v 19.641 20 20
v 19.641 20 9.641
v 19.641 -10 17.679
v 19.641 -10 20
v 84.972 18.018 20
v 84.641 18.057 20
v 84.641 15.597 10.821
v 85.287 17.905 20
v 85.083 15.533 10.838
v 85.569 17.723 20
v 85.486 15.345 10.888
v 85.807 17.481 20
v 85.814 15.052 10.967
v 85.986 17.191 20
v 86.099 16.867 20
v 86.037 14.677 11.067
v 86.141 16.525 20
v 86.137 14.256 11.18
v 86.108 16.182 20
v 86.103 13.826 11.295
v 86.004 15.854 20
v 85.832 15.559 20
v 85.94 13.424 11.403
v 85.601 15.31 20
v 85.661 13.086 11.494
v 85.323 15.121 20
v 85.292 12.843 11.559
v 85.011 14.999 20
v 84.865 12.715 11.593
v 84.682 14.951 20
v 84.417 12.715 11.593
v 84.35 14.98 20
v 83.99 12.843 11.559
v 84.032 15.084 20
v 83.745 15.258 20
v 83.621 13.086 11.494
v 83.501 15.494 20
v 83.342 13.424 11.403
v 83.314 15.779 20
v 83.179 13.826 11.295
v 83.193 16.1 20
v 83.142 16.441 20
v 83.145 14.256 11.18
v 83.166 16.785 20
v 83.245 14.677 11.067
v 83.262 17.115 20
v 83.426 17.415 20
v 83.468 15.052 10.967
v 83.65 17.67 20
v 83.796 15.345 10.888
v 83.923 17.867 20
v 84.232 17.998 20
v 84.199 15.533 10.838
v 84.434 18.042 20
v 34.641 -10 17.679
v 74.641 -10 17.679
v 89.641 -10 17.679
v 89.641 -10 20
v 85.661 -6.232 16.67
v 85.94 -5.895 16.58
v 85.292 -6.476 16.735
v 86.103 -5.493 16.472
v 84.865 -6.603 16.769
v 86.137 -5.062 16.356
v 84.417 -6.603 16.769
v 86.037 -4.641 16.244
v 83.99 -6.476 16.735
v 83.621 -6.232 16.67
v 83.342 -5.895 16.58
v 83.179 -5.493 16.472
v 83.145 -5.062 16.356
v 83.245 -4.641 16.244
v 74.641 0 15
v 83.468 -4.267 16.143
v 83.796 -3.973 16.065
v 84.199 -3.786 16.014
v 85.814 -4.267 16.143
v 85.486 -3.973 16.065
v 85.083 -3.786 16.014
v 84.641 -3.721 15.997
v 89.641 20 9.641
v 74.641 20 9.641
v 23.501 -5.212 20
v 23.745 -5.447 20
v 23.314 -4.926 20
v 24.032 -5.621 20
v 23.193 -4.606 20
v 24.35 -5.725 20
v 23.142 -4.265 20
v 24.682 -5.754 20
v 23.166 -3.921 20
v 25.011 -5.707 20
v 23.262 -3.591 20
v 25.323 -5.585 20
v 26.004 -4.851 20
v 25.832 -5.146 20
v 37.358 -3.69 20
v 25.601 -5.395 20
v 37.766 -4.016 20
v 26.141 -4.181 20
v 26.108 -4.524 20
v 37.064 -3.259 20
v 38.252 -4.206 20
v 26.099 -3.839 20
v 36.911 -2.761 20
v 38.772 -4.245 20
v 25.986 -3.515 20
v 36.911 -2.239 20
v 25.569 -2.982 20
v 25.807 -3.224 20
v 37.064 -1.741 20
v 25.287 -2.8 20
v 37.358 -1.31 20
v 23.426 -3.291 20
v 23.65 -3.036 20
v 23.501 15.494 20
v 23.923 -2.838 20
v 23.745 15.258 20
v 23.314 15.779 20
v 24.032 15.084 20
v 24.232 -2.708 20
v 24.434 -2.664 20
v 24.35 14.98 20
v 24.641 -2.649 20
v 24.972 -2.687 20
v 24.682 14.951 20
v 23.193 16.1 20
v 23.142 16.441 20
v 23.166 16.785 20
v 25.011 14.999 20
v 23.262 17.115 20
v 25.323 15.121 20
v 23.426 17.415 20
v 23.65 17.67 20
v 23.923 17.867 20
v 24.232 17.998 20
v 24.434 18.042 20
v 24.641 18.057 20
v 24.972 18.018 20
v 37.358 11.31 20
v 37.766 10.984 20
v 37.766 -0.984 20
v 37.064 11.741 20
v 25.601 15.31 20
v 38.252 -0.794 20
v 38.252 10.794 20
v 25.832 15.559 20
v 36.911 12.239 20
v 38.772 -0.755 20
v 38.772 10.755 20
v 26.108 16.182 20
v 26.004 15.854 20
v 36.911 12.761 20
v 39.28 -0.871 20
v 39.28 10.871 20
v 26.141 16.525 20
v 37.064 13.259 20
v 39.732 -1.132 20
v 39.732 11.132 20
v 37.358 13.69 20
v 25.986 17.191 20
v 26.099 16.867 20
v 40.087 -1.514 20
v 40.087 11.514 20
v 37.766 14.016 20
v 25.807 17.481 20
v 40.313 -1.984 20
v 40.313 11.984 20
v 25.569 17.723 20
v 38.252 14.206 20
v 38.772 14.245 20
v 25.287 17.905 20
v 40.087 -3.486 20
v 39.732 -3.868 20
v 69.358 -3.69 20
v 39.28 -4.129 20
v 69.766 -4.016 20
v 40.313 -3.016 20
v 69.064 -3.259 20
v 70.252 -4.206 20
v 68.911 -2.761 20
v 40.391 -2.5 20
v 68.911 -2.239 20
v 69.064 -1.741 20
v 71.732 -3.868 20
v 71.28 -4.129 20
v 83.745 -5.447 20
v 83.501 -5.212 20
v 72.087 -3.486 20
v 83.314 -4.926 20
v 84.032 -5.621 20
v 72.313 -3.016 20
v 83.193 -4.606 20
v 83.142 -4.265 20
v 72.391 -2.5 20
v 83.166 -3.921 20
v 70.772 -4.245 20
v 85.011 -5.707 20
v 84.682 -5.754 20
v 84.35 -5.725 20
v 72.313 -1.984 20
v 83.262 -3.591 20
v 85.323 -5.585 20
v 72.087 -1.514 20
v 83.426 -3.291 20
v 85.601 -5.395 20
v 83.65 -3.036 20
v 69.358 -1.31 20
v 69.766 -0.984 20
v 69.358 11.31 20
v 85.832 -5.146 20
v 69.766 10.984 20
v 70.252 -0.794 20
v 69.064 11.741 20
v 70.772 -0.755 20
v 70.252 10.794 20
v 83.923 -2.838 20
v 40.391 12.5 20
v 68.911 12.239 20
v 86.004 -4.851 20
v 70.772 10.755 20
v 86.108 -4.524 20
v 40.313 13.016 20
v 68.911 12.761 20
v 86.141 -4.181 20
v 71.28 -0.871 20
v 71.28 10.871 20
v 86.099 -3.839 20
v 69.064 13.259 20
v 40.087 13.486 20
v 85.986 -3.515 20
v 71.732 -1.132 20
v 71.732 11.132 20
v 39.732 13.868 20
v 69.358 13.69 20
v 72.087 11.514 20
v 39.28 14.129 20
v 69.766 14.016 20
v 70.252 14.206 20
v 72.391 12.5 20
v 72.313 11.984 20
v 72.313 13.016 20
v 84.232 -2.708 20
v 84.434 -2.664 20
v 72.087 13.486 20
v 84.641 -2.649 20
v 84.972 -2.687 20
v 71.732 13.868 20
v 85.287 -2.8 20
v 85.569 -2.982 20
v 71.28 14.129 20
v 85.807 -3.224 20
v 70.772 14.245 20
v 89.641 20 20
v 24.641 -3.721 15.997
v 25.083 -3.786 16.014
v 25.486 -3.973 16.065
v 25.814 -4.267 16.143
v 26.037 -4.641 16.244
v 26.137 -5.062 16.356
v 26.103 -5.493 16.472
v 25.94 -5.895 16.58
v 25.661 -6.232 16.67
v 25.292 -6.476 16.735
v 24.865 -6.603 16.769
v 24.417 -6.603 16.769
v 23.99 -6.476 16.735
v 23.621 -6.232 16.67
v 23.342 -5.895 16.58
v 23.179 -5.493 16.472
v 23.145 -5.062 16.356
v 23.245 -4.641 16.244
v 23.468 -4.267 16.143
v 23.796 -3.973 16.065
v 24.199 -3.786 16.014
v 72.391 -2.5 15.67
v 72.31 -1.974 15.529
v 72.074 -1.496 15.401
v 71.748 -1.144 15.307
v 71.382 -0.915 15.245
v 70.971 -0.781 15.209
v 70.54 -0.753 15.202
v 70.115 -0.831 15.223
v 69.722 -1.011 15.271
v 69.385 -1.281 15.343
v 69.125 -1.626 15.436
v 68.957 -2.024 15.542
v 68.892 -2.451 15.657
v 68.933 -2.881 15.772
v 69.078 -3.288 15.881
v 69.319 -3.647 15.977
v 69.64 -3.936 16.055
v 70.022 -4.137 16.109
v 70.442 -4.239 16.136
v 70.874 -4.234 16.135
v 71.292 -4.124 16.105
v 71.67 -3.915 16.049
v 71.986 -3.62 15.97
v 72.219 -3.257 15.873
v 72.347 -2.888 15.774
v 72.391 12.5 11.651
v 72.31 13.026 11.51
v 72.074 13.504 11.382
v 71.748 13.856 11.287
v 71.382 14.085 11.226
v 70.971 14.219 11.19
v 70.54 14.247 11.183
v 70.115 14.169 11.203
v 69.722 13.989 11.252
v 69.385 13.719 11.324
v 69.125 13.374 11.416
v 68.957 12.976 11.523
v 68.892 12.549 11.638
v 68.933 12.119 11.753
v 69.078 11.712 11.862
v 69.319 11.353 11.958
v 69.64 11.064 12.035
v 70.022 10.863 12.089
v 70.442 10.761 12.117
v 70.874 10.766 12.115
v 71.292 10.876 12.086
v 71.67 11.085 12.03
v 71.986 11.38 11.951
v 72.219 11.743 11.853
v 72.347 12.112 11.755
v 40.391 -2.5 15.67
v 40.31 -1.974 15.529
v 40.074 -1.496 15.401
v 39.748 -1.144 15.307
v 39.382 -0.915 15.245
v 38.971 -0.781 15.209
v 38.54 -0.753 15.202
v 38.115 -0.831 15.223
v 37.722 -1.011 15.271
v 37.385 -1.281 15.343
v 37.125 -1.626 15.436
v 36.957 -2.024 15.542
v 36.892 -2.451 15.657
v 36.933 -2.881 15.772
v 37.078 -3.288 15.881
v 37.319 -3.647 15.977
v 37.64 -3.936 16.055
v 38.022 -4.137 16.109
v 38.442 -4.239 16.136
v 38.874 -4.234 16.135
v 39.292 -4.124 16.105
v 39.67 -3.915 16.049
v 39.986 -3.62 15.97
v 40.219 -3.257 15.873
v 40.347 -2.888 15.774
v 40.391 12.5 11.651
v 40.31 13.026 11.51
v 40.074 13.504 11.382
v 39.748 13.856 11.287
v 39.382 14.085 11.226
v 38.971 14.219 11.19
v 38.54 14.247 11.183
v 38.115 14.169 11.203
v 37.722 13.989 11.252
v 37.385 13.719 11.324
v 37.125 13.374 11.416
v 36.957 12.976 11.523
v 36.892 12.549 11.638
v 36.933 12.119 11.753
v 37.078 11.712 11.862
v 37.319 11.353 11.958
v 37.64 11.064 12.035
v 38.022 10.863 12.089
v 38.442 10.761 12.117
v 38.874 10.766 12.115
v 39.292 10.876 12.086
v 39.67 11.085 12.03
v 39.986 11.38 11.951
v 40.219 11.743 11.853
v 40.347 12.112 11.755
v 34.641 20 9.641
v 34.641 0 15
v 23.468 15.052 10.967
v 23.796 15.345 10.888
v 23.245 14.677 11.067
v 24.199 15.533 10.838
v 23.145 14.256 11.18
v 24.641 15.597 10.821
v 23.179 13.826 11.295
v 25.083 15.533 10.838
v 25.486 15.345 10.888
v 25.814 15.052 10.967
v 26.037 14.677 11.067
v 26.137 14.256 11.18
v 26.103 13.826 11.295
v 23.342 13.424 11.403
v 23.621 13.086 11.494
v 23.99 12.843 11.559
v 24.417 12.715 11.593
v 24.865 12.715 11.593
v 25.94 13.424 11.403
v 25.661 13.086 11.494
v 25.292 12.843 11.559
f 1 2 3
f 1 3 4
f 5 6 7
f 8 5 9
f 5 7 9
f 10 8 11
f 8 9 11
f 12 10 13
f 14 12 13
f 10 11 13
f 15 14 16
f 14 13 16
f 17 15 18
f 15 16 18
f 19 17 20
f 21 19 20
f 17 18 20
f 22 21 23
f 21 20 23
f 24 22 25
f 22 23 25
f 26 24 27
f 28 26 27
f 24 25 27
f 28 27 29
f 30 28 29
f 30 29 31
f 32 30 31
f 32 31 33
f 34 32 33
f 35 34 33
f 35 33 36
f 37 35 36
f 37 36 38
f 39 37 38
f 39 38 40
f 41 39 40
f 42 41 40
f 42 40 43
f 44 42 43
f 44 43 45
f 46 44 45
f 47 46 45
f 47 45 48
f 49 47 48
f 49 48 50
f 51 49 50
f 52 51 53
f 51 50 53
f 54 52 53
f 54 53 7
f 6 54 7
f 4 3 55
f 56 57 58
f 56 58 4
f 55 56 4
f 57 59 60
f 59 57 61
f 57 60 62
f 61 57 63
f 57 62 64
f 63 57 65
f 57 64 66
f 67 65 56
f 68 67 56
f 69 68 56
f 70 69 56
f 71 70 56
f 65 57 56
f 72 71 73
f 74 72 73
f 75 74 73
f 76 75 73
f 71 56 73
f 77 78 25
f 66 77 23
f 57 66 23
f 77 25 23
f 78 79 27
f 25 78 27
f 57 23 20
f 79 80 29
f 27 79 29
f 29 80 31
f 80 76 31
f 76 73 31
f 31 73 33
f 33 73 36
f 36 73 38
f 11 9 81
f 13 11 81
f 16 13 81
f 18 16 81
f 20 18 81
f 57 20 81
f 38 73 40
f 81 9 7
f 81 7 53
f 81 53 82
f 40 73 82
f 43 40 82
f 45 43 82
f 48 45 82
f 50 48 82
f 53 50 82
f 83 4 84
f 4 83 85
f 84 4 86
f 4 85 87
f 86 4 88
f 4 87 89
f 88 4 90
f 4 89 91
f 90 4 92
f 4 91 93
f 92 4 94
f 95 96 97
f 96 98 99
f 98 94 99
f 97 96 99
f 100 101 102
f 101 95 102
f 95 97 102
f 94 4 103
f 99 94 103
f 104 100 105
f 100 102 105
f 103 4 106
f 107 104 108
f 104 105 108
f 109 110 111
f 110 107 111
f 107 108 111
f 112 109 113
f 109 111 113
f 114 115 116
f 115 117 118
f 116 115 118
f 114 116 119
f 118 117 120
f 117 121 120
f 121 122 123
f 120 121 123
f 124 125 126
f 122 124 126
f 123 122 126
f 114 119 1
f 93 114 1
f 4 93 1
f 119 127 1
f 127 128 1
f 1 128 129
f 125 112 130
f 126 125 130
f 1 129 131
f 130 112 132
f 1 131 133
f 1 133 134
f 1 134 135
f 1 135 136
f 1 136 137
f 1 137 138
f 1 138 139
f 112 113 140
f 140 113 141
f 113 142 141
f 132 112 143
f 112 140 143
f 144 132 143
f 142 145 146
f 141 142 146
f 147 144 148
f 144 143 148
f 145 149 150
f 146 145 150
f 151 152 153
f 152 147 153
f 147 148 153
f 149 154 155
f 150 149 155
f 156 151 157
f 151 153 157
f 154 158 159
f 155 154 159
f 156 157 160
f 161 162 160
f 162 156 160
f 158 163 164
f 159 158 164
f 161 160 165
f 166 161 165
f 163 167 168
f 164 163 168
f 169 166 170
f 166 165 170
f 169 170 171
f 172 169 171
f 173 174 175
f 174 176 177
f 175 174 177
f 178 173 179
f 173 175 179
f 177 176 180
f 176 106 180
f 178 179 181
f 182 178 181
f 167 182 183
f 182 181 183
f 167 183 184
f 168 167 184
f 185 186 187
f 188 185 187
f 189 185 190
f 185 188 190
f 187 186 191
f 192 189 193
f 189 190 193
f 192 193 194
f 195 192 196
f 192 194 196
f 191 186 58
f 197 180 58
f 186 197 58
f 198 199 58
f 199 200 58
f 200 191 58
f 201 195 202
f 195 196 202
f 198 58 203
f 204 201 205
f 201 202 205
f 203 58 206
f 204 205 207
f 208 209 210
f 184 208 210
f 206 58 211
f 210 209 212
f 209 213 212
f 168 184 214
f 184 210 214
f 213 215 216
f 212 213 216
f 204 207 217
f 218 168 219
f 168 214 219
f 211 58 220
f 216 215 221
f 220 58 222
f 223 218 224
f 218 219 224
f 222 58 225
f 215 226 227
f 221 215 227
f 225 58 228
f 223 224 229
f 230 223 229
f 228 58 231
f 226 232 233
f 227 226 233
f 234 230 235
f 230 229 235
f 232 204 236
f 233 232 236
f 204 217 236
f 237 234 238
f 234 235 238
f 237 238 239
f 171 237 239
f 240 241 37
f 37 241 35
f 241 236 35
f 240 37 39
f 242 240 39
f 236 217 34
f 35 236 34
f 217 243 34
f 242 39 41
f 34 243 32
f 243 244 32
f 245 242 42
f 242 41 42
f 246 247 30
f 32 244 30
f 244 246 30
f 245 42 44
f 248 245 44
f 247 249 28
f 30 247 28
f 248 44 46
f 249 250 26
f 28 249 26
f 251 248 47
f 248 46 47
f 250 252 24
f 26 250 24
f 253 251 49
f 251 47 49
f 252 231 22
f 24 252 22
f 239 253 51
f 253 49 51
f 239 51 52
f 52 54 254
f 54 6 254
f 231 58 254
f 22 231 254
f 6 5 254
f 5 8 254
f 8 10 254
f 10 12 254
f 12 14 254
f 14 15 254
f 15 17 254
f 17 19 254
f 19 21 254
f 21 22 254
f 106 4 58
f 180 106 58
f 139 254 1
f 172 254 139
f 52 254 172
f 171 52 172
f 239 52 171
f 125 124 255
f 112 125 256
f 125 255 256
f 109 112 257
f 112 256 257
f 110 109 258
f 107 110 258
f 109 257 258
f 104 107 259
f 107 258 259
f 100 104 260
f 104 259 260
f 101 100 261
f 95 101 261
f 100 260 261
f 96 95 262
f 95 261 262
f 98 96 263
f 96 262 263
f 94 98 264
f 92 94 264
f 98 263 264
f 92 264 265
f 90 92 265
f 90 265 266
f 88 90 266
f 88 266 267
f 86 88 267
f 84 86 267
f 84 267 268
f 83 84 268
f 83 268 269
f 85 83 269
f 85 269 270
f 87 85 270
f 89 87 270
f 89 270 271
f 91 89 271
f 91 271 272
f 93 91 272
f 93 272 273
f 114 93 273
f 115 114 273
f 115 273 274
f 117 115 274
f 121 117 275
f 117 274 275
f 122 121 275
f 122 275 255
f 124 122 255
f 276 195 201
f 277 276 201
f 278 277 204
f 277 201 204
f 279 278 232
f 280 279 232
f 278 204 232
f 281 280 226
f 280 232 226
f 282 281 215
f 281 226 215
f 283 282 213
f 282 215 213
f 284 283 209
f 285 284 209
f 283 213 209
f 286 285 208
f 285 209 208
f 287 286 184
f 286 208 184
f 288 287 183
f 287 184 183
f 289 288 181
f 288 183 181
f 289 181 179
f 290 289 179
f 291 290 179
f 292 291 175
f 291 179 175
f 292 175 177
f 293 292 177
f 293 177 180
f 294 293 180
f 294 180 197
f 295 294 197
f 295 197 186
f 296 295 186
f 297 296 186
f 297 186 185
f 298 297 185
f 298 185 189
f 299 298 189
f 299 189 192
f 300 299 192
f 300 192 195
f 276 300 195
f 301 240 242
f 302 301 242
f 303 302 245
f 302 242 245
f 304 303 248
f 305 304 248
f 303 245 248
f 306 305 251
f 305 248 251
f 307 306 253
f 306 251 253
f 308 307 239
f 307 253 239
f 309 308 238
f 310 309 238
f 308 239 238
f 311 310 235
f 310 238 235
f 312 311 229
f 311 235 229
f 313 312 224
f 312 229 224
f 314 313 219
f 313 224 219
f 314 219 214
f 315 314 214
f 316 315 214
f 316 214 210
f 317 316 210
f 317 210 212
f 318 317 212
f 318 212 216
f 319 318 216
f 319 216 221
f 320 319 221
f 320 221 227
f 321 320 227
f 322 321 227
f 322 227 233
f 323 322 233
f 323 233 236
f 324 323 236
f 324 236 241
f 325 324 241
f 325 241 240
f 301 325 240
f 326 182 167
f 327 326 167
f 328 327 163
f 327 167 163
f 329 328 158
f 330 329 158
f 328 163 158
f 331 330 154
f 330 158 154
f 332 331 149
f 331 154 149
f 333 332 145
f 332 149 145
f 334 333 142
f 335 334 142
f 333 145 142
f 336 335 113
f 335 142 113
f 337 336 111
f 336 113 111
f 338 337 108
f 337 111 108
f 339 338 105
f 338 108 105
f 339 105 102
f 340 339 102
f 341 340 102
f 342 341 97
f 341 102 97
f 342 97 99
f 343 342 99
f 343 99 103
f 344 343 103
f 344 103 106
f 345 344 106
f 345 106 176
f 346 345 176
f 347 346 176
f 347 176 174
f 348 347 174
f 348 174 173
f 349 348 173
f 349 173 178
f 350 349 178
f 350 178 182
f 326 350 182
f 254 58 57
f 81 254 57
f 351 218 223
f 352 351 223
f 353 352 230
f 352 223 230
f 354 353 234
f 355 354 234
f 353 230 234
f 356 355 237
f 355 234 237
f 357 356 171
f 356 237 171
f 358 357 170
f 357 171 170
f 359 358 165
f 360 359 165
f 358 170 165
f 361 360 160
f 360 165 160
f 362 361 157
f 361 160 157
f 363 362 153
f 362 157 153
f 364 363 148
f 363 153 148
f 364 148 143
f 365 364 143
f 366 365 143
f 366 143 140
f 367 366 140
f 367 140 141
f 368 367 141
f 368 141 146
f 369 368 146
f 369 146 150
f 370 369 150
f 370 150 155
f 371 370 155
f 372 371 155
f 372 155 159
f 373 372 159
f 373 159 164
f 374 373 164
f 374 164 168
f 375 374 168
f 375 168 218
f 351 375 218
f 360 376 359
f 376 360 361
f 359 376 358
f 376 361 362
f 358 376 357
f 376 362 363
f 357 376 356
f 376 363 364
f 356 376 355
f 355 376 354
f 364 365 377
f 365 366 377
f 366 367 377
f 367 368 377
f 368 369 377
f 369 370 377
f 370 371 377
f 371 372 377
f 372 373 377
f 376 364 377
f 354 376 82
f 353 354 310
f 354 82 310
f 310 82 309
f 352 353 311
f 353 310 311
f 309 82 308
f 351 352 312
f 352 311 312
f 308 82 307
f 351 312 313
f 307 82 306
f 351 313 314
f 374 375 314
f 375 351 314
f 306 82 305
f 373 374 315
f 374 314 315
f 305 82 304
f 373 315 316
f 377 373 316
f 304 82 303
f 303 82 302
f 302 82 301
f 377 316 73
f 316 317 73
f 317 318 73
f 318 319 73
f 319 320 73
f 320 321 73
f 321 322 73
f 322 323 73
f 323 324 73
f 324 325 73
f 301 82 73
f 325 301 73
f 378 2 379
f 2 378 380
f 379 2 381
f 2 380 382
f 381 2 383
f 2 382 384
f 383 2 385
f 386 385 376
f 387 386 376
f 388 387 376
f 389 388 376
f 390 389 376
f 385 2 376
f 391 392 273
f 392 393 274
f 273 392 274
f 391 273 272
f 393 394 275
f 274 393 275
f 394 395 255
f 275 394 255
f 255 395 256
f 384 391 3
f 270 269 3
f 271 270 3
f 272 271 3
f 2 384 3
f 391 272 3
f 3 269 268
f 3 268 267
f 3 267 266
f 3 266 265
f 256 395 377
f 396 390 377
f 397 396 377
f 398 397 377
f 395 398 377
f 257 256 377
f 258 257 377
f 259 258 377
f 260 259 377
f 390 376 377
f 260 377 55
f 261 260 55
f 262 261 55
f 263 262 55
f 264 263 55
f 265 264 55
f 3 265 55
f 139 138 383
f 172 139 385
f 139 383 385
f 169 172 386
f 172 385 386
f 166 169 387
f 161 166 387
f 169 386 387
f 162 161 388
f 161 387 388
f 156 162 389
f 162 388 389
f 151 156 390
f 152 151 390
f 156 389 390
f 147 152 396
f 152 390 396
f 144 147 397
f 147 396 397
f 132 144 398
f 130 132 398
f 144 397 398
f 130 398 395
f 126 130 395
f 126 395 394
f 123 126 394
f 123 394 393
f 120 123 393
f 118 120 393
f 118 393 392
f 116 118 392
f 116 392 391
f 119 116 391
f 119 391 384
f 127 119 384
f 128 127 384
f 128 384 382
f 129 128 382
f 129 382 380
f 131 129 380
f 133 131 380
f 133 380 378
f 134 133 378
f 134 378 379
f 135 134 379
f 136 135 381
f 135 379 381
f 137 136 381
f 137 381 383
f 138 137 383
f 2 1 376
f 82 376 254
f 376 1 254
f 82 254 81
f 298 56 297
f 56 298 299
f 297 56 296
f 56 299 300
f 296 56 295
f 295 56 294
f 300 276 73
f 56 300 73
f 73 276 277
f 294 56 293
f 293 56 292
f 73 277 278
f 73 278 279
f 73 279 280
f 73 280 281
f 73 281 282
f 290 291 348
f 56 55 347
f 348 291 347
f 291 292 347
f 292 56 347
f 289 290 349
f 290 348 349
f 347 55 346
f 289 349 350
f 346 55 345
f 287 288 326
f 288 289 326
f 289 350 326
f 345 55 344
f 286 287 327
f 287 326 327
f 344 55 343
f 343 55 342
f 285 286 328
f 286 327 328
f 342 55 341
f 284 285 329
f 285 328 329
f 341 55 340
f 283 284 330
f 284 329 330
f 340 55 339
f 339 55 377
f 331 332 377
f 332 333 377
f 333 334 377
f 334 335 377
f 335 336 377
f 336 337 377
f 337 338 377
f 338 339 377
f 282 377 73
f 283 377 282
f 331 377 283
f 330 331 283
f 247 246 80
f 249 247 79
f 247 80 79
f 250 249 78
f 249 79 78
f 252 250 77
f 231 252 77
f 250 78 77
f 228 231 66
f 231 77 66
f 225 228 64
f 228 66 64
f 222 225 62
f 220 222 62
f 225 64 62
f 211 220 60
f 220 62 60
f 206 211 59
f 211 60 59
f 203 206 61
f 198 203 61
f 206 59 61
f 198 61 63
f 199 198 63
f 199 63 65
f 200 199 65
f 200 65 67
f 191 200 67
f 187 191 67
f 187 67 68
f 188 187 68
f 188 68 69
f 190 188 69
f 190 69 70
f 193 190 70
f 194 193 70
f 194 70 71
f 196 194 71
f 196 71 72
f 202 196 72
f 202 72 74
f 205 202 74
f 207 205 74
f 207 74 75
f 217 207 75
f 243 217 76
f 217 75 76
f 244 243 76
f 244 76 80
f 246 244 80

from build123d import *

# Parameters (mm, degrees)
EXTRUDE_1_DEPTH     = 40
EXTRUDE_2_DEPTH     = 40
SKETCH_9_W          = 20.5
SKETCH_9_H          = 20
CUT_EXTRUDE_2_DEPTH = 20
SKETCH_10_W         = 4.875
SKETCH_10_H         = 20
CUT_EXTRUDE_3_DEPTH = 20
CUT_EXTRUDE_4_DEPTH = 55
SKETCH_12_W         = 51.656841865
SKETCH_12_H         = 34.217395835
CUT_EXTRUDE_5_DEPTH = 34
EXTRUDE_3_DEPTH     = 40
SKETCH_16_R         = 1.75
CUT_EXTRUDE_6_DEPTH = 10
EXTRUDE_4_DEPTH     = 15
EXTRUDE_5_DEPTH     = 15
SKETCH_19_R         = 1.5
CUT_EXTRUDE_7_DEPTH = 10


with BuildPart() as part:
    # 草图1 → 凸台-拉伸1 (new body)
    with BuildSketch(Plane.XY):
        Polygon((74.641016151, 0), (74.641016151, 20), (34.641016151, 20), (34.641016151, 9.282032303), (34.641016151, 0), align=None)
    extrude(amount=EXTRUDE_1_DEPTH)

    # 草图8 → 凸台-拉伸2 (add)
    with BuildSketch(Plane(origin=(74.641016151, 0, 0), x_dir=(0, 0, -1), z_dir=(1, 0, 0))):
        Polygon((0, 0), (0, 20), (5.358983849, 20), align=None)
    extrude(amount=-EXTRUDE_2_DEPTH)

    # 草图9 → 切除-拉伸2 (cut)
    with BuildSketch(Plane.XY.offset(40)):
        with Locations((54.641016151, 10)):
            Rectangle(SKETCH_9_W, SKETCH_9_H)
    extrude(amount=-CUT_EXTRUDE_2_DEPTH, mode=Mode.SUBTRACT)

    # 草图10 → 切除-拉伸3 (cut)
    with BuildSketch(Plane.XY.offset(40)):
        with Locations((72.203516151, 10)):
            Rectangle(SKETCH_10_W, SKETCH_10_H)
        with Locations((37.078516151, 10)):
            Rectangle(SKETCH_10_W, SKETCH_10_H)
    extrude(amount=-CUT_EXTRUDE_3_DEPTH, mode=Mode.SUBTRACT)

    # 草图11 → 切除-拉伸4 (cut)
    with BuildSketch(Plane(origin=(74.641016151, 0, 0), x_dir=(0, 0, -1), z_dir=(1, 0, 0))):
        Polygon((0, 0), (5.358983849, 20), (-9.641016151, 20), (-15, 0), align=None)
    extrude(amount=-CUT_EXTRUDE_4_DEPTH, mode=Mode.SUBTRACT)

    # 草图12 → 切除-拉伸5 (cut)
    with BuildSketch(Plane.XY.offset(20)):
        with Locations((55.994076619, 8.947658785)):
            Rectangle(SKETCH_12_W, SKETCH_12_H)
    extrude(amount=CUT_EXTRUDE_5_DEPTH, mode=Mode.SUBTRACT)

    # 草图15 → 凸台-拉伸3 (add)
    with BuildSketch(Plane.ZY.offset(-34.641016151)):
        Polygon((20, 0), (20, -10), (17.679491924, -10), (15, 0), align=None)
    extrude(amount=-EXTRUDE_3_DEPTH)

    # 草图16 → 切除-拉伸6 (cut)
    with BuildSketch(Plane.XY.offset(20)):
        with Locations((38.641016151, 12.5)):
            Circle(SKETCH_16_R)
        with Locations((70.641016151, 12.5)):
            Circle(SKETCH_16_R)
        with Locations((70.641016151, -2.5)):
            Circle(SKETCH_16_R)
        with Locations((38.641016151, -2.5)):
            Circle(SKETCH_16_R)
    extrude(amount=-CUT_EXTRUDE_6_DEPTH, mode=Mode.SUBTRACT)

    # 草图17 → 凸台-拉伸4 (add)
    with BuildSketch(Plane(origin=(74.641016151, 0, 0), x_dir=(0, 0, -1), z_dir=(1, 0, 0))):
        Polygon((-20, 20), (-20, -10), (-17.679491924, -10), (-9.641016151, 20), align=None)
    extrude(amount=EXTRUDE_4_DEPTH)

    # 草图18 → 凸台-拉伸5 (add)
    with BuildSketch(Plane.ZY.offset(-34.641016151)):
        Polygon((20, 20), (9.641016151, 20), (17.679491924, -10), (20, -10), align=None)
    extrude(amount=EXTRUDE_5_DEPTH)

    # 草图19 → 切除-拉伸7 (cut)
    with BuildSketch(Plane(origin=(0, 3.75, 13.995190528), x_dir=(-1, 0, 0), z_dir=(0, -0.2588190451025213, -0.9659258262890682))):
        with Locations(Location((-84.641016151, -9.235047481, 0), (0, 0, 90))):
            Circle(SKETCH_19_R)
        with Locations(Location((-84.641016151, 10.764952519, 0), (0, 0, 90))):
            Circle(SKETCH_19_R)
        with Locations(Location((-24.641016151, -9.235047481, 0), (0, 0, 90))):
            Circle(SKETCH_19_R)
        with Locations(Location((-24.641016151, 10.764952519, 0), (0, 0, 90))):
            Circle(SKETCH_19_R)
    extrude(amount=-CUT_EXTRUDE_7_DEPTH, mode=Mode.SUBTRACT)


solid = part.part
